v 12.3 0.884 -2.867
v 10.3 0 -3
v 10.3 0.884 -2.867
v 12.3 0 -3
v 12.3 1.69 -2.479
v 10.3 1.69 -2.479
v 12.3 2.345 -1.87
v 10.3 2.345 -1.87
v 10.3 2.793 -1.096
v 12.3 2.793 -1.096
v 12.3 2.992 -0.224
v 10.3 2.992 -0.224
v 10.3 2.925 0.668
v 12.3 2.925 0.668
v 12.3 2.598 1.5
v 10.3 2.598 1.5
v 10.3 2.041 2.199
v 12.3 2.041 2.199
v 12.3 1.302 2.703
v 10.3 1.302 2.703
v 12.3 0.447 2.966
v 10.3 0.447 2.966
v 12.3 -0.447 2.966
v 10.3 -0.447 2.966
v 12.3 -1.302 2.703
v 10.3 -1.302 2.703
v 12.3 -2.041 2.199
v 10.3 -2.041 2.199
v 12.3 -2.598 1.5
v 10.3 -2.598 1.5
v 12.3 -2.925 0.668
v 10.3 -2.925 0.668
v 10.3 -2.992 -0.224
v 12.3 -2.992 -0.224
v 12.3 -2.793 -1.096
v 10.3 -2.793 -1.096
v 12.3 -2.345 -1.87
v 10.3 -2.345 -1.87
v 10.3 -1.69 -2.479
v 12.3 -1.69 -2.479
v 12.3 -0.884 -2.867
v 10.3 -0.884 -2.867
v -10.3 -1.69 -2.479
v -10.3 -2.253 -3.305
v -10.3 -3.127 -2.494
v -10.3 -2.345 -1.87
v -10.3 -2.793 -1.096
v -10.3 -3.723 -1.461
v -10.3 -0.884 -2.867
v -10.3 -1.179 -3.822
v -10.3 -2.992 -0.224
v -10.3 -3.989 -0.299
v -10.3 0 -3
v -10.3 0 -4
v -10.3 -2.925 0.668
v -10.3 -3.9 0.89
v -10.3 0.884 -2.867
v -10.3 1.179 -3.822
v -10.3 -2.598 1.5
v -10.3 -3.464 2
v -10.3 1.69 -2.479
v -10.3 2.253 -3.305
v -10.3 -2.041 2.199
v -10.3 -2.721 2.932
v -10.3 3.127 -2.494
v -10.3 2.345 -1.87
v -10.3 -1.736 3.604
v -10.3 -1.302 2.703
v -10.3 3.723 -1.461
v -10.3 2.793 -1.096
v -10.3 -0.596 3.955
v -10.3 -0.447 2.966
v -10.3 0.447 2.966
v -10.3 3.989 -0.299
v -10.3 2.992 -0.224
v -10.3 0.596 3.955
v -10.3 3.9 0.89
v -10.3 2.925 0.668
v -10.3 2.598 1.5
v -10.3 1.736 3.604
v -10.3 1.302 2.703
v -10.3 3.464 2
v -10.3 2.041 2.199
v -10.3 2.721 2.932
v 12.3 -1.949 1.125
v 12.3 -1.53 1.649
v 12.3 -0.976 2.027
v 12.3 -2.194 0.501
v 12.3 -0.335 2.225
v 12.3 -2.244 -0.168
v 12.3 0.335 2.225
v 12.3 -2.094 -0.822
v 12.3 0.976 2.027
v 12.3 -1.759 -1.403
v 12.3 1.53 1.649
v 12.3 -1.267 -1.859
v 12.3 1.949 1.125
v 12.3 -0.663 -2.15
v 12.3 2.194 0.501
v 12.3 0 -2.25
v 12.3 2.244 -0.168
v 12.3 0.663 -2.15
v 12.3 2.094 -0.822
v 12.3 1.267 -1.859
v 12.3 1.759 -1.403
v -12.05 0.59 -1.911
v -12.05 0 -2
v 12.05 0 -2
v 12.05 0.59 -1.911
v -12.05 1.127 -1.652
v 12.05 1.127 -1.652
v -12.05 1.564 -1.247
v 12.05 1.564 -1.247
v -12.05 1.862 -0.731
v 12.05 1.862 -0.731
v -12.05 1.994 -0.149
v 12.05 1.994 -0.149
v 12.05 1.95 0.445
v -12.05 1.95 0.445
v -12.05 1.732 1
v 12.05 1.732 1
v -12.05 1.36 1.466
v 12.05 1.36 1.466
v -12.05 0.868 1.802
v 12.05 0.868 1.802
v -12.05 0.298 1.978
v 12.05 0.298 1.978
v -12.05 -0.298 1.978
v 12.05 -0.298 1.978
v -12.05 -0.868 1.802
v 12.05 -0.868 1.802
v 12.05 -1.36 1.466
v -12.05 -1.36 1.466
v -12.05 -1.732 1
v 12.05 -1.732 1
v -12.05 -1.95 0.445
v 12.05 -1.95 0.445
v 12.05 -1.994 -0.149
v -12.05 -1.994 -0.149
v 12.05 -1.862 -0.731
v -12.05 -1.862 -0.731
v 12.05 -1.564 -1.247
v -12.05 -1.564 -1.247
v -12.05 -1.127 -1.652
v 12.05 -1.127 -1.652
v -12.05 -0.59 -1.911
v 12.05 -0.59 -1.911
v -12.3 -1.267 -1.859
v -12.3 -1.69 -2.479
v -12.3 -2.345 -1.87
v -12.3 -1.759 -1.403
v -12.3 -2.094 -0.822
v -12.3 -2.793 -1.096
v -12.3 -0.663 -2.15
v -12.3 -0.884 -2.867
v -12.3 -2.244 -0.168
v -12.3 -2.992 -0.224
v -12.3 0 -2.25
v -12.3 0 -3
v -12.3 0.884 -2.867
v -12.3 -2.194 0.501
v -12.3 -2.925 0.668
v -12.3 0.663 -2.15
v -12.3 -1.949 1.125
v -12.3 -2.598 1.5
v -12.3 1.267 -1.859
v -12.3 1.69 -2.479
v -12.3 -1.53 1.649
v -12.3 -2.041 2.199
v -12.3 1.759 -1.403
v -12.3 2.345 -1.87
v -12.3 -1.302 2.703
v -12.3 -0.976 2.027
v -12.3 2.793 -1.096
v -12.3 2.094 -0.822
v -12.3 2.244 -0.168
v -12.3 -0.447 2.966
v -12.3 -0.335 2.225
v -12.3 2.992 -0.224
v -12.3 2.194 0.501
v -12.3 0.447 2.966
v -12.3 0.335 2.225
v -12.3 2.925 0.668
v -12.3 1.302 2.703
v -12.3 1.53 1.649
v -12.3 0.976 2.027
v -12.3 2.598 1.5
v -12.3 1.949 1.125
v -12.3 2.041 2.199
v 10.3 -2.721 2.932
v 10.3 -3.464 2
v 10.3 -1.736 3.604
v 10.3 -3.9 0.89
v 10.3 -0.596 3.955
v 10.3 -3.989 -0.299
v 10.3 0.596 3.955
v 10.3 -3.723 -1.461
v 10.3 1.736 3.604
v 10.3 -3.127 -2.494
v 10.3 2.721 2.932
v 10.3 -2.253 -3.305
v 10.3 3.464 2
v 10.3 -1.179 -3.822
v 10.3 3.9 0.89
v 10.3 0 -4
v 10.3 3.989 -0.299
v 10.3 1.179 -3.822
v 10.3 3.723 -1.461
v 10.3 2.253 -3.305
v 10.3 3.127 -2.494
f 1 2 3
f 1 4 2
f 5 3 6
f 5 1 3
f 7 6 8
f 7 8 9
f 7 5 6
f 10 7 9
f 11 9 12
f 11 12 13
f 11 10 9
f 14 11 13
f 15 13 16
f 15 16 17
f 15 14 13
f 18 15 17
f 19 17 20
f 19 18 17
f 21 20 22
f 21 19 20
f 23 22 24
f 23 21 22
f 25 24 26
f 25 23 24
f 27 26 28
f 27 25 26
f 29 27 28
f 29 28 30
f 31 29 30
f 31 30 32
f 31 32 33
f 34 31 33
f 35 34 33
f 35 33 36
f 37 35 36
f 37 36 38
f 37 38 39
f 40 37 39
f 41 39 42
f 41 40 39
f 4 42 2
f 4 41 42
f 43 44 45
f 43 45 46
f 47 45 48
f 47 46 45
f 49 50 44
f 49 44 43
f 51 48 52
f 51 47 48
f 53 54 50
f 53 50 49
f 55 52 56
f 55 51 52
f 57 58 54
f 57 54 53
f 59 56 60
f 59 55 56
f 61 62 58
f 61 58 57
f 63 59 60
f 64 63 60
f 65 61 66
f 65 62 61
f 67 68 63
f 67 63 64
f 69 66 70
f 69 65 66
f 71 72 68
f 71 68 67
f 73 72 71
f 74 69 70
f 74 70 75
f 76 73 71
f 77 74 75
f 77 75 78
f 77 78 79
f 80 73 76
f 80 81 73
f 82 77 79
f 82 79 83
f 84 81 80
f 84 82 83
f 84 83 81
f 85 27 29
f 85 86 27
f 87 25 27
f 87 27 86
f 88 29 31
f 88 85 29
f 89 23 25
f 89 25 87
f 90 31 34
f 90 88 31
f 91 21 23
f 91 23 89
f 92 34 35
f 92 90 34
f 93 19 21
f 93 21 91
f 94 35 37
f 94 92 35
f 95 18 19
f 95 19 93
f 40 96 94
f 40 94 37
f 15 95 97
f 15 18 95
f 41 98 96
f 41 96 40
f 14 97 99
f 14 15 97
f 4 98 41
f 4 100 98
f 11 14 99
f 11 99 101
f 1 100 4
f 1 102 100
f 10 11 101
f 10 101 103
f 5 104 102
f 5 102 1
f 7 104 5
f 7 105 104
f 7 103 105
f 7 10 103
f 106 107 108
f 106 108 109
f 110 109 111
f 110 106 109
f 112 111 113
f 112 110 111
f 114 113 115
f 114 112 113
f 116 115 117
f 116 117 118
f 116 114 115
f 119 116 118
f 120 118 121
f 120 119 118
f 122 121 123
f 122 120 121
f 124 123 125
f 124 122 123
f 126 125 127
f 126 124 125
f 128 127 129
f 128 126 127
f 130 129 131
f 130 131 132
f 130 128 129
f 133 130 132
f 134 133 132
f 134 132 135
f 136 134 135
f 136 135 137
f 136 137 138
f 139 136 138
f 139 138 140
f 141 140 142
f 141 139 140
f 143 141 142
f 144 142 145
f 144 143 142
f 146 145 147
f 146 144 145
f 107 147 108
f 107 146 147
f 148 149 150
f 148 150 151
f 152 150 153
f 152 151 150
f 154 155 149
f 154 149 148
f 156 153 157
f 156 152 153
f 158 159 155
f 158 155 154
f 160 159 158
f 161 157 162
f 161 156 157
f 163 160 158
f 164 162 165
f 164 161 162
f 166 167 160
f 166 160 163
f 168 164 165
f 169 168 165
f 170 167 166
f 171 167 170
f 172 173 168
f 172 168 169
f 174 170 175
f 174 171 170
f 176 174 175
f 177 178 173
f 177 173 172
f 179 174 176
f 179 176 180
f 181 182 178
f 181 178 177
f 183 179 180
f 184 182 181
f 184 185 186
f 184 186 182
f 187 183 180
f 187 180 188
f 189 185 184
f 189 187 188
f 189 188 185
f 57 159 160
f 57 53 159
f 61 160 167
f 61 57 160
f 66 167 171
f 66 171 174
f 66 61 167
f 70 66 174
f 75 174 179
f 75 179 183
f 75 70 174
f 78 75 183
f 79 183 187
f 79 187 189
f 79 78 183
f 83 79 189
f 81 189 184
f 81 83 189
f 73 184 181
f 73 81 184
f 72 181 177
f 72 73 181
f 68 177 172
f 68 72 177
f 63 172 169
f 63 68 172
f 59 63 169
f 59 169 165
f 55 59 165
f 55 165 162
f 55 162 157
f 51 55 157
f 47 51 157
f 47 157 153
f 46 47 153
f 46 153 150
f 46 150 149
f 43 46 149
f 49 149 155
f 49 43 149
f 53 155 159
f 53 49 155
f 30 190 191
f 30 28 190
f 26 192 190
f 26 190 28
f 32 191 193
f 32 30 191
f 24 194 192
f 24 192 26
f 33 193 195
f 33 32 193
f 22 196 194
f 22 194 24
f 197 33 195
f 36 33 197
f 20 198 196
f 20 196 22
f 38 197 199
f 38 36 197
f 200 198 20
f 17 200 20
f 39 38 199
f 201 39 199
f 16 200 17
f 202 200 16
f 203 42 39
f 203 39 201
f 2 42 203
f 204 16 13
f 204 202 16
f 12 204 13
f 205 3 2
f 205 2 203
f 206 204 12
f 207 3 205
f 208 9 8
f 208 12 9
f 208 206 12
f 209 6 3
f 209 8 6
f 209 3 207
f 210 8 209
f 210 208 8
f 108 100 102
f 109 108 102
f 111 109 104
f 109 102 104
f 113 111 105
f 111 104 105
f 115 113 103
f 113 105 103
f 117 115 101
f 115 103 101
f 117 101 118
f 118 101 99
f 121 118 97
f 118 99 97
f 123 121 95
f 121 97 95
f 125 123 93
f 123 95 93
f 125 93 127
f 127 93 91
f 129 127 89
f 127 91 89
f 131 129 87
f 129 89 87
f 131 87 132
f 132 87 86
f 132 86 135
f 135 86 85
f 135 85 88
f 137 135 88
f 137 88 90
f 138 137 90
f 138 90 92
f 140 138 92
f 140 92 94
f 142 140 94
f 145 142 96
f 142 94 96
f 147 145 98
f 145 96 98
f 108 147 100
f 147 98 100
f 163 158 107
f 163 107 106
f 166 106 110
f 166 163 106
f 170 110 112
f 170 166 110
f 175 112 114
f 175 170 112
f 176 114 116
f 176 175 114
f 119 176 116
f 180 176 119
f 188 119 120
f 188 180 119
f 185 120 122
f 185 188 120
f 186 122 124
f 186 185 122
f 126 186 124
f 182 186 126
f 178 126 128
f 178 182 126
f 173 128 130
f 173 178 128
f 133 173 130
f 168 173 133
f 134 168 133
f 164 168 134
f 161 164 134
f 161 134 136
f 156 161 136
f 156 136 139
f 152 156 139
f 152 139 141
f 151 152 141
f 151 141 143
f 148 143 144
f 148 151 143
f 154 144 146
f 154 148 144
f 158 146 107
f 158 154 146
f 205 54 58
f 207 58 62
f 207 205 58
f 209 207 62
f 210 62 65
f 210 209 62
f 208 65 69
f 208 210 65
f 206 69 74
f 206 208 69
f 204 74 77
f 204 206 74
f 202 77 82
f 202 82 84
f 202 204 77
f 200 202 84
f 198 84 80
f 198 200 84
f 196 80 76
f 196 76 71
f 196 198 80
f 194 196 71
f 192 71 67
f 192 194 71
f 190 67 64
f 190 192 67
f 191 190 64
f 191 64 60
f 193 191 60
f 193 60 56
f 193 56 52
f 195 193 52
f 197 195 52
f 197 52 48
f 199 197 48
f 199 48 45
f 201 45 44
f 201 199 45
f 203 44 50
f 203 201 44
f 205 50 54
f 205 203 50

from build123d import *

# Parameters (mm, degrees)
F2_SIZE2 = 0.25
F2_SIZE  = 0.25


with BuildPart() as f1:
    # F0 (on Front) → F1 (revolve)
    with BuildSketch(Plane.XZ):
        Polygon((12.3, -2), (-12.3, -2), (-12.3, -3), (-10.3, -3), (-10.3, -4), (10.3, -4), (10.3, -3), (12.3, -3), align=None)
    revolve(axis=Axis((-53.131774, 0, 0), (1, 0, 0)))

    # F2
    f2_edges = [f1.edges().sort_by_distance(p)[0] for p in [
        (12.3, 0, 2),
        (-12.3, 0, 2),
        (0, 0, -2),
    ]]
    chamfer(f2_edges, length=F2_SIZE, length2=F2_SIZE2)


solid = f1.part
